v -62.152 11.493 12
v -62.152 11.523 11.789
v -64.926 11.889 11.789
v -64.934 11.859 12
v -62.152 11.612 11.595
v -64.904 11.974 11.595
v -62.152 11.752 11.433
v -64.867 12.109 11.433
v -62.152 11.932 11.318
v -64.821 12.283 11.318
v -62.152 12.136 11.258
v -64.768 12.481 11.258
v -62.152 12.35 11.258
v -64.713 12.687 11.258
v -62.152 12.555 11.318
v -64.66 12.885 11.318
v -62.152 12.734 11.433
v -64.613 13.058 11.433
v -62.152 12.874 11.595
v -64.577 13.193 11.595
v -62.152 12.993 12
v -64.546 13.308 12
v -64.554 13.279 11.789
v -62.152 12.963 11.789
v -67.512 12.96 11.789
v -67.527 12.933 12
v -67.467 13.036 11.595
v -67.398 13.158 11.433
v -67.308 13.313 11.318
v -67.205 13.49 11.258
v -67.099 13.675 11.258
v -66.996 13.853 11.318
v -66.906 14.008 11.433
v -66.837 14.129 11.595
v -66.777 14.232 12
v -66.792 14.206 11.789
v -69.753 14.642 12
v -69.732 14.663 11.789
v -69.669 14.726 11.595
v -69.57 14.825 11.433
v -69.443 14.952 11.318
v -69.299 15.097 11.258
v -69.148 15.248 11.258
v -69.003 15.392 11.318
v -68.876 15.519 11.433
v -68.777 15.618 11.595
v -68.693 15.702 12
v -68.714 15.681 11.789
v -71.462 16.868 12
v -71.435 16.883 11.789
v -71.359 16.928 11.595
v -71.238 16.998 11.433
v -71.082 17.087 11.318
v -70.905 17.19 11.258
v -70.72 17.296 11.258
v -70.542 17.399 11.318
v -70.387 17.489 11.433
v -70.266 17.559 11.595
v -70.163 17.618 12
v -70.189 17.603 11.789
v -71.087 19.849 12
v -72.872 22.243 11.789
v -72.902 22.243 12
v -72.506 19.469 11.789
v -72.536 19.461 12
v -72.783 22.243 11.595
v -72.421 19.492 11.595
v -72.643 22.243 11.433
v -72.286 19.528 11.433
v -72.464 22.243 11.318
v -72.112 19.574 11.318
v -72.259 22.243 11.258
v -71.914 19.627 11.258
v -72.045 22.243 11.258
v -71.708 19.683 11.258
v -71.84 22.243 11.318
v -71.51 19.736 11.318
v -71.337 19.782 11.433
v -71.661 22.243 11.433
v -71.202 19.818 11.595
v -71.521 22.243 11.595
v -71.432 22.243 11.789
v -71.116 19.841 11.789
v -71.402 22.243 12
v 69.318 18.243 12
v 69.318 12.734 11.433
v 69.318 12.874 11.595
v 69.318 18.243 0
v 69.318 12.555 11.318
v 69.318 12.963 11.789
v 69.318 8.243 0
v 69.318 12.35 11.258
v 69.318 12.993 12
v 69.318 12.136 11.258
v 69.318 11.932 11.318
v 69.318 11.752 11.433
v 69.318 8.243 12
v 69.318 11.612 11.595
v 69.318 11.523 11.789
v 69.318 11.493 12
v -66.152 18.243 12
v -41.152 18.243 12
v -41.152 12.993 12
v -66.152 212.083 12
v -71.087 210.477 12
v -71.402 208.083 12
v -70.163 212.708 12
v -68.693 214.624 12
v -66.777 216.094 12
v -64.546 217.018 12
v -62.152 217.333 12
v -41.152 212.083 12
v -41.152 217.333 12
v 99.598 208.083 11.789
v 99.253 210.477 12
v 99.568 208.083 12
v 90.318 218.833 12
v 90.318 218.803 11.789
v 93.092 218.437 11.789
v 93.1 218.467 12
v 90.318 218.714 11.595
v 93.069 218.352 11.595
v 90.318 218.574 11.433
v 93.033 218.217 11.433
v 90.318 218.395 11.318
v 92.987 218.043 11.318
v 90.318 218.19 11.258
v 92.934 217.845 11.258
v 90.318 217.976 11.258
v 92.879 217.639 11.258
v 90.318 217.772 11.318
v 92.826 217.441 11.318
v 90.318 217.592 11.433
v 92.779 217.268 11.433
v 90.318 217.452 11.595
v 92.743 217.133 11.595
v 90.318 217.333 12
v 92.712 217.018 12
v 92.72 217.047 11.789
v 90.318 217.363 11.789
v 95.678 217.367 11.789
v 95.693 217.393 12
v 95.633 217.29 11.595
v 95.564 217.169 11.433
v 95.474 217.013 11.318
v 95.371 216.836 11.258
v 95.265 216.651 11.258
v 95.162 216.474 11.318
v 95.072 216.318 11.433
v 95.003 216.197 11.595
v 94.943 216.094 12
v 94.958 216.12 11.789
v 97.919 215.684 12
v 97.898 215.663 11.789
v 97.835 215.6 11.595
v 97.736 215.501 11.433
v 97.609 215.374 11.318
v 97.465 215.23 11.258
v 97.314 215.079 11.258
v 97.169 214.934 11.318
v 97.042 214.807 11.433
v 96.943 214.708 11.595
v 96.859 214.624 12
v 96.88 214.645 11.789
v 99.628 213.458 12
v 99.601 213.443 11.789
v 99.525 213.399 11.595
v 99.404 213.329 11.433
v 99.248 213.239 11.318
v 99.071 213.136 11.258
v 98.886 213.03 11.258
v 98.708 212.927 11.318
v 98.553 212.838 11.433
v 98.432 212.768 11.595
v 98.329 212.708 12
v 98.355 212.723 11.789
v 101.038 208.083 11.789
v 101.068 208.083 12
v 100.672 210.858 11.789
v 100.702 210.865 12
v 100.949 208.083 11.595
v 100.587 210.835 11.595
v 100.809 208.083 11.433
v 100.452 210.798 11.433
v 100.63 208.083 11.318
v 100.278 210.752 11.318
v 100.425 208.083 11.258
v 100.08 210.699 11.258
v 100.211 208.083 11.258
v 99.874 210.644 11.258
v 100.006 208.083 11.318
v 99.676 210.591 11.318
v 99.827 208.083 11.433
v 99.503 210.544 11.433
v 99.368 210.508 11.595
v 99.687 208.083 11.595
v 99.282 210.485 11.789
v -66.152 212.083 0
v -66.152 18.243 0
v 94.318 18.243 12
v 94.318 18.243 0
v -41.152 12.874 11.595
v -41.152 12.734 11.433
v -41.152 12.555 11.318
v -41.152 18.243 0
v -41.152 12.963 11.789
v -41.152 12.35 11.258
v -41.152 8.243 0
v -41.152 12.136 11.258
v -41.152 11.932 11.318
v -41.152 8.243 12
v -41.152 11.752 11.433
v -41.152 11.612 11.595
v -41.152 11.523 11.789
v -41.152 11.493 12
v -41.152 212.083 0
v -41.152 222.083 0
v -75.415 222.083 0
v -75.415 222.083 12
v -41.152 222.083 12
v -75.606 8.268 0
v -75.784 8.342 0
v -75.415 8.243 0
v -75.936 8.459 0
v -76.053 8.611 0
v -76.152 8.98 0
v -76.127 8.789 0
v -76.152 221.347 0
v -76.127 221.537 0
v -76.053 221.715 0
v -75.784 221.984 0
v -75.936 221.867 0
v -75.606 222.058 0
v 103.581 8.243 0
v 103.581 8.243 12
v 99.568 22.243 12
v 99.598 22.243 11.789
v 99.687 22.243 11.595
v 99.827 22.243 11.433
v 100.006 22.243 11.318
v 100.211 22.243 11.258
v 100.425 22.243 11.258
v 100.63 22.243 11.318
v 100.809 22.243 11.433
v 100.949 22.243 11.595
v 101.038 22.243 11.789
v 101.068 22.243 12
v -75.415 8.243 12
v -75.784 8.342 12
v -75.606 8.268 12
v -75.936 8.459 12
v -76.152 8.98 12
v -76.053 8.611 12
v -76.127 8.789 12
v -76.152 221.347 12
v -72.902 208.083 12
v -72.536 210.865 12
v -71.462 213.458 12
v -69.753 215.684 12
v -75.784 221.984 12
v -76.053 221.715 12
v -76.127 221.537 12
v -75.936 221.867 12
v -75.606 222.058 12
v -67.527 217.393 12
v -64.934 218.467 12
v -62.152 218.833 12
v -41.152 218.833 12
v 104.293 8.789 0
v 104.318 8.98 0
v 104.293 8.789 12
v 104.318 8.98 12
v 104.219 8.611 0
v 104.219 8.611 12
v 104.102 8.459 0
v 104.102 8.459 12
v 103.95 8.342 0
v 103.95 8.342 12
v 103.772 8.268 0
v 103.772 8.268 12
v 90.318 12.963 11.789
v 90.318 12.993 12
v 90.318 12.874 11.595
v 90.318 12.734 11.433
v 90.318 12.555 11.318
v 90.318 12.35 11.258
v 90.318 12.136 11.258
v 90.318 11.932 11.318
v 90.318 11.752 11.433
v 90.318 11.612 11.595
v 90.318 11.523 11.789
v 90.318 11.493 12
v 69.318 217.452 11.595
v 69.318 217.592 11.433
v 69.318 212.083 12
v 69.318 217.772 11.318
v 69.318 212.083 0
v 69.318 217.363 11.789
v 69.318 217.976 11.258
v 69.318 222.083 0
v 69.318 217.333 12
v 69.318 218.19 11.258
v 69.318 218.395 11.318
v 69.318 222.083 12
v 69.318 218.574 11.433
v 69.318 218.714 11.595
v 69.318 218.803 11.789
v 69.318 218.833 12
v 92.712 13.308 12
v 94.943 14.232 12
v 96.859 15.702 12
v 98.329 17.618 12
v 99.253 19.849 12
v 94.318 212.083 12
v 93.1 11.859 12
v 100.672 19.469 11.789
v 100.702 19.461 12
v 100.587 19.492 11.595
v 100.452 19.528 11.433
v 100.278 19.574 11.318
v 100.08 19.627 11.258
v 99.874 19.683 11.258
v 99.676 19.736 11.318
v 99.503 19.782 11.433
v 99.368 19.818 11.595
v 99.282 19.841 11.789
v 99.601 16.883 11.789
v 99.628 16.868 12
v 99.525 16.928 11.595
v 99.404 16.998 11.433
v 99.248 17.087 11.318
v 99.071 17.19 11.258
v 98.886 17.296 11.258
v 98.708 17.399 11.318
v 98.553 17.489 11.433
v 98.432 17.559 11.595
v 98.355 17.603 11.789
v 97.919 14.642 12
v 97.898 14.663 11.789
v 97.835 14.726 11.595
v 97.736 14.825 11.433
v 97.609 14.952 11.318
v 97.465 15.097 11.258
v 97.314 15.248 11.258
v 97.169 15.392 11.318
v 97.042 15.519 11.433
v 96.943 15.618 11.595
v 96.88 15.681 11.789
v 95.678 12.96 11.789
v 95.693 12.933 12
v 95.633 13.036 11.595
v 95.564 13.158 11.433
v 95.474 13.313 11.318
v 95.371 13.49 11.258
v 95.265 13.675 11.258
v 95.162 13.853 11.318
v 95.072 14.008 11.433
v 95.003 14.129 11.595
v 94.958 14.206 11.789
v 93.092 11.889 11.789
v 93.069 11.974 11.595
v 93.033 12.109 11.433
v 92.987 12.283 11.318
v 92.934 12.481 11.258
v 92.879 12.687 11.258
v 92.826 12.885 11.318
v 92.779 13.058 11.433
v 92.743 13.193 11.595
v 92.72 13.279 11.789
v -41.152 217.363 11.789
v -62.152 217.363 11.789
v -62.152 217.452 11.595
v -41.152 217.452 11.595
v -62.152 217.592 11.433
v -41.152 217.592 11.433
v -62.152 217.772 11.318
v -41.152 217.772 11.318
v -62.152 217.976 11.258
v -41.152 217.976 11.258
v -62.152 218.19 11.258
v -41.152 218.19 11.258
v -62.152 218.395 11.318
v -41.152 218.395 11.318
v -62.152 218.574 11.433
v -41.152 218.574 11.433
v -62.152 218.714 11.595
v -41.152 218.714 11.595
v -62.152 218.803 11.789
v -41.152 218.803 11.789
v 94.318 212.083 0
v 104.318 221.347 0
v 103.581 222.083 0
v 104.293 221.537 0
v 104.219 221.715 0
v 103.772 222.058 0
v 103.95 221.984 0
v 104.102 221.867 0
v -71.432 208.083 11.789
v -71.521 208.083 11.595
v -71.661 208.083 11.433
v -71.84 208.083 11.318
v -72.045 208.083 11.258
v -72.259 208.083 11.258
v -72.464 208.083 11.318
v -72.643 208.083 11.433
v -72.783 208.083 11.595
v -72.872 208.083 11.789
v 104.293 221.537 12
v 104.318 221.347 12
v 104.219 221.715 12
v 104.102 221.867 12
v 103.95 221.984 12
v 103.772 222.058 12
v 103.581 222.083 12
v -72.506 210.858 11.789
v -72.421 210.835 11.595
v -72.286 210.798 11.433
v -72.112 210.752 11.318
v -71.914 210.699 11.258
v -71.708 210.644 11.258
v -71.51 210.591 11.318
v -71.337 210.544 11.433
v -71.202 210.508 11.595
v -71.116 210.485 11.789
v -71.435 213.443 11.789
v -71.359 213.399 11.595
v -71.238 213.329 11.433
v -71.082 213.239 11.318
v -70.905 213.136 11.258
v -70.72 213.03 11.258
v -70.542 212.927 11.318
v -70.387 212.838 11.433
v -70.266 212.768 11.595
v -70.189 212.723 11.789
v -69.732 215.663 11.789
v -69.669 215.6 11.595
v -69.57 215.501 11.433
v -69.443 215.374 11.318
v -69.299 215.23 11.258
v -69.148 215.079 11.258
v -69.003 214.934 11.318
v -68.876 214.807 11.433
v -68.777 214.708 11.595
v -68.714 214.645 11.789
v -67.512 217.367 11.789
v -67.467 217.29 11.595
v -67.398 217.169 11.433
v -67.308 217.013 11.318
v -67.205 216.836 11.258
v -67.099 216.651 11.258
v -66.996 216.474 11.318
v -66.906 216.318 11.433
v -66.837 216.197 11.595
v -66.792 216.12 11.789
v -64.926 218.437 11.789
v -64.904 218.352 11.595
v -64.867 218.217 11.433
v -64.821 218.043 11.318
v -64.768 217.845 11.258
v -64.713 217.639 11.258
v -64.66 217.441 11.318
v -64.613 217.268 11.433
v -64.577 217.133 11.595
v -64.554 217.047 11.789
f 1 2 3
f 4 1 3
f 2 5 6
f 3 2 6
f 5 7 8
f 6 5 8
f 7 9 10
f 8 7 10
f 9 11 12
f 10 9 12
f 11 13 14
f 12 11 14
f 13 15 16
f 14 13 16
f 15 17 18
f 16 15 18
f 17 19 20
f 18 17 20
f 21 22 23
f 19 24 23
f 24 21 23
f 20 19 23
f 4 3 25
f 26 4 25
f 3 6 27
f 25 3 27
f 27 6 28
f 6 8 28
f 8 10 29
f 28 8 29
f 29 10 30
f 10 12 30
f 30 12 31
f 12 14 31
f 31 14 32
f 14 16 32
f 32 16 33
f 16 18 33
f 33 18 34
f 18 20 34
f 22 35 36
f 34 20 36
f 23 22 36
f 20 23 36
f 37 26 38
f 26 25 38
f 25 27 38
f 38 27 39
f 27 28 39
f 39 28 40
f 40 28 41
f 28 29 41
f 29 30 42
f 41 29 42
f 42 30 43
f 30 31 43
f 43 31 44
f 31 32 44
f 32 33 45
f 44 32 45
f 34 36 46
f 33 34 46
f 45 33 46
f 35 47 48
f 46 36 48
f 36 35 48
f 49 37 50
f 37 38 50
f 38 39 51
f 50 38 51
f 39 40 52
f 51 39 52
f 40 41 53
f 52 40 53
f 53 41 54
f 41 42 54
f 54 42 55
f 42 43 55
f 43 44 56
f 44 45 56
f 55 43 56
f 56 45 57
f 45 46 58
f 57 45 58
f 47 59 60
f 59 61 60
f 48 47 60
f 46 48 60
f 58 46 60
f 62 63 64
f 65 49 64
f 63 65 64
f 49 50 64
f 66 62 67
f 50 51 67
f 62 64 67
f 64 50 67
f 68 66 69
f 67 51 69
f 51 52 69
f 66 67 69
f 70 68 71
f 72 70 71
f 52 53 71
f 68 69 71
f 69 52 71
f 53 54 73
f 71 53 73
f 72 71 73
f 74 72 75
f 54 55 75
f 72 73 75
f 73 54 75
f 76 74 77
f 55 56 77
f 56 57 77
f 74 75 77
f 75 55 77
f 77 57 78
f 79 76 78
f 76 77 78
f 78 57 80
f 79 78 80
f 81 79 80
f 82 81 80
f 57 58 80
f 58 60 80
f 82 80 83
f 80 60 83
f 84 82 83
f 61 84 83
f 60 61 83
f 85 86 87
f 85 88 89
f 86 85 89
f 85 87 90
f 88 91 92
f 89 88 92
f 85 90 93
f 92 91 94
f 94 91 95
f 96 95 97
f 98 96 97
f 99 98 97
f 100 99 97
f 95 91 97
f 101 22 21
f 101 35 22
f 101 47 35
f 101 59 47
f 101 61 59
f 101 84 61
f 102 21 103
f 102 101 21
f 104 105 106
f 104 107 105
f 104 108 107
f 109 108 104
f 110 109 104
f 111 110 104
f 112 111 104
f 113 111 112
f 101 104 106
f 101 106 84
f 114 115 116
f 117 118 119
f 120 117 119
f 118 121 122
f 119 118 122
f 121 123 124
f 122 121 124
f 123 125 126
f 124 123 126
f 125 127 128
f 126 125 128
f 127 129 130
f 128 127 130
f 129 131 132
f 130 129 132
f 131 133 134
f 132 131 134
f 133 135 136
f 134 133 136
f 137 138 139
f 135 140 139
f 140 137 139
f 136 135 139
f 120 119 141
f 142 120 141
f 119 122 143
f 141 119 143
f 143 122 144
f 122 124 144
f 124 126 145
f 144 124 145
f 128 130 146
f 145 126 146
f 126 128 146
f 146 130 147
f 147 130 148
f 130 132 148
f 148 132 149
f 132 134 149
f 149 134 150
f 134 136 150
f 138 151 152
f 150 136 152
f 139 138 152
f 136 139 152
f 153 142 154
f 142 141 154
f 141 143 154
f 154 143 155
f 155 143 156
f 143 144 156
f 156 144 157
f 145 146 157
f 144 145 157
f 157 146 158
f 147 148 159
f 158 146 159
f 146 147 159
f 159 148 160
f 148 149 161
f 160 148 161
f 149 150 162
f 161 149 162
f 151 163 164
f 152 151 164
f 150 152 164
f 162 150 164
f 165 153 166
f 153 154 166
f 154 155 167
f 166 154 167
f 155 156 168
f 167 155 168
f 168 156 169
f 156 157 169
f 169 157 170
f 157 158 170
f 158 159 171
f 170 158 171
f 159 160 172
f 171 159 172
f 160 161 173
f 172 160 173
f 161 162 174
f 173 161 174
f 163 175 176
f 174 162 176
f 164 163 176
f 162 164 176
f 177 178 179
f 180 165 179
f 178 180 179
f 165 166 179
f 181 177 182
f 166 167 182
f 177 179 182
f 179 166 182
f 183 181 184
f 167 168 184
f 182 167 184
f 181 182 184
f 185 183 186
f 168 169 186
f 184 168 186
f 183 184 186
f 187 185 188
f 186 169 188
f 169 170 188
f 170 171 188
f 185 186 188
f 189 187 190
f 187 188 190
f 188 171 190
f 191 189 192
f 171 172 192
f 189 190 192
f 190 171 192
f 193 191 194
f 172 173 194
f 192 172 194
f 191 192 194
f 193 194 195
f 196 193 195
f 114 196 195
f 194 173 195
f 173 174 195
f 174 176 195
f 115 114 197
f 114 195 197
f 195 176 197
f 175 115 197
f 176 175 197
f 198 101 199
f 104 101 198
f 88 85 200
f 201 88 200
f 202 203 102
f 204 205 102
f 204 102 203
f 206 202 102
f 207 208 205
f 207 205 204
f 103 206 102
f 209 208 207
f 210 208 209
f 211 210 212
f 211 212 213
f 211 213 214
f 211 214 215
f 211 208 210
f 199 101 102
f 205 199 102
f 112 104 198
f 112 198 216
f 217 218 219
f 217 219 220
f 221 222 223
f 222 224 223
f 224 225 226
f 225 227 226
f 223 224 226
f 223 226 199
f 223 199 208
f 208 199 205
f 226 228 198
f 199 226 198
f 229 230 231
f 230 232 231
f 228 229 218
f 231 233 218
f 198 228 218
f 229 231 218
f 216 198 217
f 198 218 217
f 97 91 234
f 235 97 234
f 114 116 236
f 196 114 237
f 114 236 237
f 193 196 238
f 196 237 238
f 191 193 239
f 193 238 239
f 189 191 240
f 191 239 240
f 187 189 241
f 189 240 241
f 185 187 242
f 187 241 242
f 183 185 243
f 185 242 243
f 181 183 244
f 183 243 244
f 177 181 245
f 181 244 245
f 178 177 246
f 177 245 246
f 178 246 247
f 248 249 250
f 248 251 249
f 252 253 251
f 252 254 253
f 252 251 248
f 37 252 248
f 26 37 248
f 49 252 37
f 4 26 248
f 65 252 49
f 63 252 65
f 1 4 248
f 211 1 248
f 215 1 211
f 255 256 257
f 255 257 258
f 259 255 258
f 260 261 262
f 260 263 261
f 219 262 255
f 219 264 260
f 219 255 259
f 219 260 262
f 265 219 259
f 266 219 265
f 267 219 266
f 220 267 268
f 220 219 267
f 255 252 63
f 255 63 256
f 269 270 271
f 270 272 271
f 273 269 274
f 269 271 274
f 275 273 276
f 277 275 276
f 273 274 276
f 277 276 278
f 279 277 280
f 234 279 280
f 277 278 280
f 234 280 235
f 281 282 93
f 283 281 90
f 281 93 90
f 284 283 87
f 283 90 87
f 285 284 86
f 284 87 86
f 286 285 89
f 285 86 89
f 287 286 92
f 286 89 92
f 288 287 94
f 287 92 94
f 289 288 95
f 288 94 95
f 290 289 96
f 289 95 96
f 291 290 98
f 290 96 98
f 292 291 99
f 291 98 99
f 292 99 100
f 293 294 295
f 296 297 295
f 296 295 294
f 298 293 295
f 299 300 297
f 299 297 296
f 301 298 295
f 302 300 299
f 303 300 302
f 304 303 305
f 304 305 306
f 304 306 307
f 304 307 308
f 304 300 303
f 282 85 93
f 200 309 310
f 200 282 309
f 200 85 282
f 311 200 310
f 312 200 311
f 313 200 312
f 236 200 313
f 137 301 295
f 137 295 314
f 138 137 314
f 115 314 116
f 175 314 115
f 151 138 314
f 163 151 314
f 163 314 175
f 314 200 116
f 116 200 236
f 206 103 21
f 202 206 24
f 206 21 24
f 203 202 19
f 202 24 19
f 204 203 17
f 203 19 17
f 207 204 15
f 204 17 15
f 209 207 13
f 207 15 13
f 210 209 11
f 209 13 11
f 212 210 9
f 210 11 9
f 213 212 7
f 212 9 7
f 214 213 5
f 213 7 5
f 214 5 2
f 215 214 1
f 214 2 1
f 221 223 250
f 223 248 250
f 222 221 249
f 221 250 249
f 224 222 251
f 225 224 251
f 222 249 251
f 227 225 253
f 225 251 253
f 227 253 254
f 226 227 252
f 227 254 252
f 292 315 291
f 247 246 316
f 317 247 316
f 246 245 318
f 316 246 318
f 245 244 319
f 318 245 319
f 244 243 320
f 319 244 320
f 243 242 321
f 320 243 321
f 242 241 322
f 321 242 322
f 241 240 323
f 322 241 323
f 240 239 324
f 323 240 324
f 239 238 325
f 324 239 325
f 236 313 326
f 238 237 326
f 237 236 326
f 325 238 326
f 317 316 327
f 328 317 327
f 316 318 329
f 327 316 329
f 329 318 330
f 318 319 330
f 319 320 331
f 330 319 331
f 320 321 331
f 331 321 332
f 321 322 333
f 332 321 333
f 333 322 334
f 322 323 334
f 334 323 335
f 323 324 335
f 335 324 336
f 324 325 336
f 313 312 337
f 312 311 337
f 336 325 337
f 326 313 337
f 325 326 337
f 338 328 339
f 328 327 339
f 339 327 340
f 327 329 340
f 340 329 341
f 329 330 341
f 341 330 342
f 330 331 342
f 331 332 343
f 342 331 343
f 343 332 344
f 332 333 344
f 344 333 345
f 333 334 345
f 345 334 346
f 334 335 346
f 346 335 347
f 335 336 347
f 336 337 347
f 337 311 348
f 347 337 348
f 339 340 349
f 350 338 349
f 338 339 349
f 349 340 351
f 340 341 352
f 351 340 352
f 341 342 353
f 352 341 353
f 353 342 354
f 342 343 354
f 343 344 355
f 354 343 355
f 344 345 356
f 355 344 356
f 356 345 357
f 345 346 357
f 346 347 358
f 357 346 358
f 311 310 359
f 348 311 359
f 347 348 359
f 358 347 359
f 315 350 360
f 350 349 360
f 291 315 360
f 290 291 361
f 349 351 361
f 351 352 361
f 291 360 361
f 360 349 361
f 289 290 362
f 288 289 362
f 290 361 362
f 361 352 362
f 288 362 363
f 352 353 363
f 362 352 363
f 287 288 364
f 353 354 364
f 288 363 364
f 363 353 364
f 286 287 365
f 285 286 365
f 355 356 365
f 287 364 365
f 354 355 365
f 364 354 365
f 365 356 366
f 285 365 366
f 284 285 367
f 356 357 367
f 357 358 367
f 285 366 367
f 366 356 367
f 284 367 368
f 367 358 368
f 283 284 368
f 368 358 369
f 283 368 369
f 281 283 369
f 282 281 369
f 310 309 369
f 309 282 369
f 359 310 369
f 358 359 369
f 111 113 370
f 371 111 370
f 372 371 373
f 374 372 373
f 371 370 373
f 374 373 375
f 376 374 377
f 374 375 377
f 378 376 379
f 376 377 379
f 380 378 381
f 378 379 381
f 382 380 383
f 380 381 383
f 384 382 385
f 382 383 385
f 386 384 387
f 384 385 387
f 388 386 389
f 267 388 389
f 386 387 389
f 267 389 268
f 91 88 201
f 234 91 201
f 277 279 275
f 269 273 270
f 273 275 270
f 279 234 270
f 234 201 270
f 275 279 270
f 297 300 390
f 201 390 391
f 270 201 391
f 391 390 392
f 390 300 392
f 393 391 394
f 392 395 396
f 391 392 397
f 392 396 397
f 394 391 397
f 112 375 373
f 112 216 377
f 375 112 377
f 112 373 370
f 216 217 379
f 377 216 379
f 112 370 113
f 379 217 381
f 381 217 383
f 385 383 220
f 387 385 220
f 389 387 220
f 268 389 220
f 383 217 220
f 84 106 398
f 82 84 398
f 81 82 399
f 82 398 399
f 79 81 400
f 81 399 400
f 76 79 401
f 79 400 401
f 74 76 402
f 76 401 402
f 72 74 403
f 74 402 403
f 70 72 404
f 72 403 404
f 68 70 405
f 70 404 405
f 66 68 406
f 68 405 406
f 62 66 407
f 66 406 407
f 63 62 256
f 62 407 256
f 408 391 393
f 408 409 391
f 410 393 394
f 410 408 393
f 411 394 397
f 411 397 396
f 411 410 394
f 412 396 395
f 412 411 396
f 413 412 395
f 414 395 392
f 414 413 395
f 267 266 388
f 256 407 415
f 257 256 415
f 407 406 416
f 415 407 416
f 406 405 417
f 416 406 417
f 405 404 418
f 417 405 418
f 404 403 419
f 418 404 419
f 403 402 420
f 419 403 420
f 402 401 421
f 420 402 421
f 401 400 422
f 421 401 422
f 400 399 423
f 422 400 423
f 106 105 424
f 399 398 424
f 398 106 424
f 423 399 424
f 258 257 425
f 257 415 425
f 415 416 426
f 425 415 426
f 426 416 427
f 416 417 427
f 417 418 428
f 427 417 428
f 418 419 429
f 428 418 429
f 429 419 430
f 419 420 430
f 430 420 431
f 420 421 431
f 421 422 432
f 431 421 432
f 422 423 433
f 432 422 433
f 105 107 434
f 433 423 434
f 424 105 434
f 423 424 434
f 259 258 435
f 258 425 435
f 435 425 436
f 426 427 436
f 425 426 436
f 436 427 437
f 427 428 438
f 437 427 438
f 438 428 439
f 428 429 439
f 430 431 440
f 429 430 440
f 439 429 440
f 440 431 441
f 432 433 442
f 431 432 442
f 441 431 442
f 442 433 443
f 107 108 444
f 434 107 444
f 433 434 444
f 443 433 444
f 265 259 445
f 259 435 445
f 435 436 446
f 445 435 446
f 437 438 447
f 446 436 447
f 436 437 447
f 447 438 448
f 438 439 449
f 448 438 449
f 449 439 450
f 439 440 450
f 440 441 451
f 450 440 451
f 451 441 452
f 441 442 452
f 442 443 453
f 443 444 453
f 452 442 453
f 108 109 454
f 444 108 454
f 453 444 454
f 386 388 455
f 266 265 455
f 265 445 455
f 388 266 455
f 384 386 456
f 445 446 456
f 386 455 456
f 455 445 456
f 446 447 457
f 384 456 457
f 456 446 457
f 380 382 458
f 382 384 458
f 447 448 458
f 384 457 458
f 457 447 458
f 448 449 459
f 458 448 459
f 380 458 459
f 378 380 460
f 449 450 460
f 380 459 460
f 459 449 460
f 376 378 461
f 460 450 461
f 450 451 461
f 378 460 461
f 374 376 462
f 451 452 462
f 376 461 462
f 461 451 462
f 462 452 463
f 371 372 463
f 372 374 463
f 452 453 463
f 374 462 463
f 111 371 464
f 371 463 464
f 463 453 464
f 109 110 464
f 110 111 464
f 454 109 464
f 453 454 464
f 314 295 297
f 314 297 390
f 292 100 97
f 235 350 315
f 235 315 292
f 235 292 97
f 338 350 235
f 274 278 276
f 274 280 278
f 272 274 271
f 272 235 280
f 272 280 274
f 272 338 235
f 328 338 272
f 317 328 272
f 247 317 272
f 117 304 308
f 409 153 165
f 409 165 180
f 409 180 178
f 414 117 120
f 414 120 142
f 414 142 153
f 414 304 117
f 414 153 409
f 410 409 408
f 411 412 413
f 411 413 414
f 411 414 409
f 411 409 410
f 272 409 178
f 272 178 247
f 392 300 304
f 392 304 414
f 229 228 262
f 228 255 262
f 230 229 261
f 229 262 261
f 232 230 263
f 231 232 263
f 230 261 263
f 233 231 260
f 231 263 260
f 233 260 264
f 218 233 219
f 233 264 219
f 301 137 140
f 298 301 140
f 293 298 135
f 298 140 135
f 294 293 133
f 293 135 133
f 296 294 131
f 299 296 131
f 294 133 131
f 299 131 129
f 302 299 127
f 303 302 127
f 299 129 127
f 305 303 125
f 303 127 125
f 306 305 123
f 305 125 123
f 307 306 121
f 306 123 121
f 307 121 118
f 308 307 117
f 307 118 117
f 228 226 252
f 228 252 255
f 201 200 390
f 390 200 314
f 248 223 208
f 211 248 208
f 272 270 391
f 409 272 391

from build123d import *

# Parameters (mm, degrees)
ESBO_O1_W                = 180.47
ESBO_O1_H                = 213.84
RESSALTO_EXTRUS_O1_DEPTH = 12
FILETE2_R                = 0.7366
FILETE3_R                = 0.7366
FILETE4_R                = 0.7366
FILETE5_R                = 0.7366
CORTE_EXTRUS_O1_REACH    = 247.657
ESBO_O2_W                = 160.47
ESBO_O2_H                = 193.84
ESBO_O4_R                = 0.75
CORTE_EXTRUS_O2_REACH    = 240.231
ESBO_O5_W                = 110.47
ESBO_O5_H                = 12
CORTE_EXTRUS_O3_REACH    = 240.231
ESBO_O6_W                = 110.47
ESBO_O6_H                = 12


with BuildPart() as part:
    # Esboço1 → Ressalto-extrusão1 (new body)
    with BuildSketch(Plane.XY):
        with Locations((14.08297041, 115.163100963)):
            Rectangle(ESBO_O1_W, ESBO_O1_H)
    extrude(amount=RESSALTO_EXTRUS_O1_DEPTH)

    # Filete2
    filete2_edges = [part.edges().sort_by_distance(p)[0] for p in [
        (104.31797041, 222.083100963, 6),
    ]]
    fillet(filete2_edges, radius=FILETE2_R)

    # Filete3
    filete3_edges = [part.edges().sort_by_distance(p)[0] for p in [
        (104.31797041, 8.243100963, 6),
    ]]
    fillet(filete3_edges, radius=FILETE3_R)

    # Filete4
    filete4_edges = [part.edges().sort_by_distance(p)[0] for p in [
        (-76.15202959, 8.243100963, 6),
    ]]
    fillet(filete4_edges, radius=FILETE4_R)

    # Filete5
    filete5_edges = [part.edges().sort_by_distance(p)[0] for p in [
        (-76.15202959, 222.083100963, 6),
    ]]
    fillet(filete5_edges, radius=FILETE5_R)

    # Esboço2 → Corte-extrusão1 (cut, up to next)
    with BuildSketch(Plane.XY.offset(12), mode=Mode.PRIVATE) as corte_extrus_o1_sk1:
        with Locations((14.08297041, 115.163100963)):
            Rectangle(ESBO_O2_W, ESBO_O2_H)
    corte_extrus_o1_tool1 = extrude(corte_extrus_o1_sk1.sketch, amount=-CORTE_EXTRUS_O1_REACH, mode=Mode.PRIVATE) & part.part
    add(corte_extrus_o1_tool1.solids().sort_by_distance((14.08297, 115.163101, 12))[0], mode=Mode.SUBTRACT)

    # Varredura de corte1: sweep along a path in Esboço3
    with BuildLine(Plane.XY.offset(12)) as varredura_de_corte1_path:
        Line((-62.15202959, 218.083100963), (90.31797041, 218.083100963))
        ThreePointArc((90.31797041, 218.083100963), (97.389038221, 215.154168775), (100.31797041, 208.083100963))
        Line((100.31797041, 208.083100963), (100.31797041, 22.243100963))
        ThreePointArc((100.31797041, 22.243100963), (97.389038221, 15.172033151), (90.31797041, 12.243100963))
        Line((90.31797041, 12.243100963), (-62.15202959, 12.243100963))
        ThreePointArc((-62.15202959, 12.243100963), (-69.223097402, 15.172033151), (-72.15202959, 22.243100963))
        Line((-72.15202959, 22.243100963), (-72.15202959, 208.083100963))
        ThreePointArc((-72.15202959, 208.083100963), (-69.223097402, 215.154168775), (-62.15202959, 218.083100963))
    # Esboço4 → Varredura de corte1 (sweep, cut)
    with BuildSketch(Plane(origin=(0, 0, 0), x_dir=(0, 0, -1), z_dir=(1, 0, 0))):
        with Locations((-12, 218.083100963)):
            Circle(ESBO_O4_R)
    sweep(path=varredura_de_corte1_path.line, mode=Mode.SUBTRACT)

    # Esboço5 → Corte-extrusão2 (cut, up to next)
    with BuildSketch(Plane(origin=(0, 222.083100963, 0), x_dir=(-1, 0, 0), z_dir=(0, 1, 0)), mode=Mode.PRIVATE) as corte_extrus_o2_sk1:
        with Locations((-14.08297041, 6)):
            Rectangle(ESBO_O5_W, ESBO_O5_H)
    corte_extrus_o2_tool1 = extrude(corte_extrus_o2_sk1.sketch, amount=-CORTE_EXTRUS_O2_REACH, mode=Mode.PRIVATE) & part.part
    add(corte_extrus_o2_tool1.solids().sort_by_distance((14.08297, 222.083101, 6))[0], mode=Mode.SUBTRACT)

    # Esboço6 → Corte-extrusão3 (cut, up to next)
    with BuildSketch(Plane.XZ.offset(-8.243100963), mode=Mode.PRIVATE) as corte_extrus_o3_sk1:
        with Locations((14.08297041, 6)):
            Rectangle(ESBO_O6_W, ESBO_O6_H)
    corte_extrus_o3_tool1 = extrude(corte_extrus_o3_sk1.sketch, amount=-CORTE_EXTRUS_O3_REACH, mode=Mode.PRIVATE) & part.part
    add(corte_extrus_o3_tool1.solids().sort_by_distance((14.08297, 8.243101, 6))[0], mode=Mode.SUBTRACT)


with BuildPart() as corte_extrus_o3_piece_1:
    # of the separate pieces the step leaves, piece 1, a body of its own (corte_extrus_o3_pieces)
    add(part.part.solids().sort_by_distance((-76.15202959, 221.346500963, 0))[0])


with BuildPart() as corte_extrus_o3_piece_2:
    # of the separate pieces the step leaves, piece 2, a body of its own (corte_extrus_o3_pieces)
    add(part.part.solids().sort_by_distance((103.58137041, 8.243100963, 0))[0])


solid = Compound([corte_extrus_o3_piece_1.part, corte_extrus_o3_piece_2.part])
